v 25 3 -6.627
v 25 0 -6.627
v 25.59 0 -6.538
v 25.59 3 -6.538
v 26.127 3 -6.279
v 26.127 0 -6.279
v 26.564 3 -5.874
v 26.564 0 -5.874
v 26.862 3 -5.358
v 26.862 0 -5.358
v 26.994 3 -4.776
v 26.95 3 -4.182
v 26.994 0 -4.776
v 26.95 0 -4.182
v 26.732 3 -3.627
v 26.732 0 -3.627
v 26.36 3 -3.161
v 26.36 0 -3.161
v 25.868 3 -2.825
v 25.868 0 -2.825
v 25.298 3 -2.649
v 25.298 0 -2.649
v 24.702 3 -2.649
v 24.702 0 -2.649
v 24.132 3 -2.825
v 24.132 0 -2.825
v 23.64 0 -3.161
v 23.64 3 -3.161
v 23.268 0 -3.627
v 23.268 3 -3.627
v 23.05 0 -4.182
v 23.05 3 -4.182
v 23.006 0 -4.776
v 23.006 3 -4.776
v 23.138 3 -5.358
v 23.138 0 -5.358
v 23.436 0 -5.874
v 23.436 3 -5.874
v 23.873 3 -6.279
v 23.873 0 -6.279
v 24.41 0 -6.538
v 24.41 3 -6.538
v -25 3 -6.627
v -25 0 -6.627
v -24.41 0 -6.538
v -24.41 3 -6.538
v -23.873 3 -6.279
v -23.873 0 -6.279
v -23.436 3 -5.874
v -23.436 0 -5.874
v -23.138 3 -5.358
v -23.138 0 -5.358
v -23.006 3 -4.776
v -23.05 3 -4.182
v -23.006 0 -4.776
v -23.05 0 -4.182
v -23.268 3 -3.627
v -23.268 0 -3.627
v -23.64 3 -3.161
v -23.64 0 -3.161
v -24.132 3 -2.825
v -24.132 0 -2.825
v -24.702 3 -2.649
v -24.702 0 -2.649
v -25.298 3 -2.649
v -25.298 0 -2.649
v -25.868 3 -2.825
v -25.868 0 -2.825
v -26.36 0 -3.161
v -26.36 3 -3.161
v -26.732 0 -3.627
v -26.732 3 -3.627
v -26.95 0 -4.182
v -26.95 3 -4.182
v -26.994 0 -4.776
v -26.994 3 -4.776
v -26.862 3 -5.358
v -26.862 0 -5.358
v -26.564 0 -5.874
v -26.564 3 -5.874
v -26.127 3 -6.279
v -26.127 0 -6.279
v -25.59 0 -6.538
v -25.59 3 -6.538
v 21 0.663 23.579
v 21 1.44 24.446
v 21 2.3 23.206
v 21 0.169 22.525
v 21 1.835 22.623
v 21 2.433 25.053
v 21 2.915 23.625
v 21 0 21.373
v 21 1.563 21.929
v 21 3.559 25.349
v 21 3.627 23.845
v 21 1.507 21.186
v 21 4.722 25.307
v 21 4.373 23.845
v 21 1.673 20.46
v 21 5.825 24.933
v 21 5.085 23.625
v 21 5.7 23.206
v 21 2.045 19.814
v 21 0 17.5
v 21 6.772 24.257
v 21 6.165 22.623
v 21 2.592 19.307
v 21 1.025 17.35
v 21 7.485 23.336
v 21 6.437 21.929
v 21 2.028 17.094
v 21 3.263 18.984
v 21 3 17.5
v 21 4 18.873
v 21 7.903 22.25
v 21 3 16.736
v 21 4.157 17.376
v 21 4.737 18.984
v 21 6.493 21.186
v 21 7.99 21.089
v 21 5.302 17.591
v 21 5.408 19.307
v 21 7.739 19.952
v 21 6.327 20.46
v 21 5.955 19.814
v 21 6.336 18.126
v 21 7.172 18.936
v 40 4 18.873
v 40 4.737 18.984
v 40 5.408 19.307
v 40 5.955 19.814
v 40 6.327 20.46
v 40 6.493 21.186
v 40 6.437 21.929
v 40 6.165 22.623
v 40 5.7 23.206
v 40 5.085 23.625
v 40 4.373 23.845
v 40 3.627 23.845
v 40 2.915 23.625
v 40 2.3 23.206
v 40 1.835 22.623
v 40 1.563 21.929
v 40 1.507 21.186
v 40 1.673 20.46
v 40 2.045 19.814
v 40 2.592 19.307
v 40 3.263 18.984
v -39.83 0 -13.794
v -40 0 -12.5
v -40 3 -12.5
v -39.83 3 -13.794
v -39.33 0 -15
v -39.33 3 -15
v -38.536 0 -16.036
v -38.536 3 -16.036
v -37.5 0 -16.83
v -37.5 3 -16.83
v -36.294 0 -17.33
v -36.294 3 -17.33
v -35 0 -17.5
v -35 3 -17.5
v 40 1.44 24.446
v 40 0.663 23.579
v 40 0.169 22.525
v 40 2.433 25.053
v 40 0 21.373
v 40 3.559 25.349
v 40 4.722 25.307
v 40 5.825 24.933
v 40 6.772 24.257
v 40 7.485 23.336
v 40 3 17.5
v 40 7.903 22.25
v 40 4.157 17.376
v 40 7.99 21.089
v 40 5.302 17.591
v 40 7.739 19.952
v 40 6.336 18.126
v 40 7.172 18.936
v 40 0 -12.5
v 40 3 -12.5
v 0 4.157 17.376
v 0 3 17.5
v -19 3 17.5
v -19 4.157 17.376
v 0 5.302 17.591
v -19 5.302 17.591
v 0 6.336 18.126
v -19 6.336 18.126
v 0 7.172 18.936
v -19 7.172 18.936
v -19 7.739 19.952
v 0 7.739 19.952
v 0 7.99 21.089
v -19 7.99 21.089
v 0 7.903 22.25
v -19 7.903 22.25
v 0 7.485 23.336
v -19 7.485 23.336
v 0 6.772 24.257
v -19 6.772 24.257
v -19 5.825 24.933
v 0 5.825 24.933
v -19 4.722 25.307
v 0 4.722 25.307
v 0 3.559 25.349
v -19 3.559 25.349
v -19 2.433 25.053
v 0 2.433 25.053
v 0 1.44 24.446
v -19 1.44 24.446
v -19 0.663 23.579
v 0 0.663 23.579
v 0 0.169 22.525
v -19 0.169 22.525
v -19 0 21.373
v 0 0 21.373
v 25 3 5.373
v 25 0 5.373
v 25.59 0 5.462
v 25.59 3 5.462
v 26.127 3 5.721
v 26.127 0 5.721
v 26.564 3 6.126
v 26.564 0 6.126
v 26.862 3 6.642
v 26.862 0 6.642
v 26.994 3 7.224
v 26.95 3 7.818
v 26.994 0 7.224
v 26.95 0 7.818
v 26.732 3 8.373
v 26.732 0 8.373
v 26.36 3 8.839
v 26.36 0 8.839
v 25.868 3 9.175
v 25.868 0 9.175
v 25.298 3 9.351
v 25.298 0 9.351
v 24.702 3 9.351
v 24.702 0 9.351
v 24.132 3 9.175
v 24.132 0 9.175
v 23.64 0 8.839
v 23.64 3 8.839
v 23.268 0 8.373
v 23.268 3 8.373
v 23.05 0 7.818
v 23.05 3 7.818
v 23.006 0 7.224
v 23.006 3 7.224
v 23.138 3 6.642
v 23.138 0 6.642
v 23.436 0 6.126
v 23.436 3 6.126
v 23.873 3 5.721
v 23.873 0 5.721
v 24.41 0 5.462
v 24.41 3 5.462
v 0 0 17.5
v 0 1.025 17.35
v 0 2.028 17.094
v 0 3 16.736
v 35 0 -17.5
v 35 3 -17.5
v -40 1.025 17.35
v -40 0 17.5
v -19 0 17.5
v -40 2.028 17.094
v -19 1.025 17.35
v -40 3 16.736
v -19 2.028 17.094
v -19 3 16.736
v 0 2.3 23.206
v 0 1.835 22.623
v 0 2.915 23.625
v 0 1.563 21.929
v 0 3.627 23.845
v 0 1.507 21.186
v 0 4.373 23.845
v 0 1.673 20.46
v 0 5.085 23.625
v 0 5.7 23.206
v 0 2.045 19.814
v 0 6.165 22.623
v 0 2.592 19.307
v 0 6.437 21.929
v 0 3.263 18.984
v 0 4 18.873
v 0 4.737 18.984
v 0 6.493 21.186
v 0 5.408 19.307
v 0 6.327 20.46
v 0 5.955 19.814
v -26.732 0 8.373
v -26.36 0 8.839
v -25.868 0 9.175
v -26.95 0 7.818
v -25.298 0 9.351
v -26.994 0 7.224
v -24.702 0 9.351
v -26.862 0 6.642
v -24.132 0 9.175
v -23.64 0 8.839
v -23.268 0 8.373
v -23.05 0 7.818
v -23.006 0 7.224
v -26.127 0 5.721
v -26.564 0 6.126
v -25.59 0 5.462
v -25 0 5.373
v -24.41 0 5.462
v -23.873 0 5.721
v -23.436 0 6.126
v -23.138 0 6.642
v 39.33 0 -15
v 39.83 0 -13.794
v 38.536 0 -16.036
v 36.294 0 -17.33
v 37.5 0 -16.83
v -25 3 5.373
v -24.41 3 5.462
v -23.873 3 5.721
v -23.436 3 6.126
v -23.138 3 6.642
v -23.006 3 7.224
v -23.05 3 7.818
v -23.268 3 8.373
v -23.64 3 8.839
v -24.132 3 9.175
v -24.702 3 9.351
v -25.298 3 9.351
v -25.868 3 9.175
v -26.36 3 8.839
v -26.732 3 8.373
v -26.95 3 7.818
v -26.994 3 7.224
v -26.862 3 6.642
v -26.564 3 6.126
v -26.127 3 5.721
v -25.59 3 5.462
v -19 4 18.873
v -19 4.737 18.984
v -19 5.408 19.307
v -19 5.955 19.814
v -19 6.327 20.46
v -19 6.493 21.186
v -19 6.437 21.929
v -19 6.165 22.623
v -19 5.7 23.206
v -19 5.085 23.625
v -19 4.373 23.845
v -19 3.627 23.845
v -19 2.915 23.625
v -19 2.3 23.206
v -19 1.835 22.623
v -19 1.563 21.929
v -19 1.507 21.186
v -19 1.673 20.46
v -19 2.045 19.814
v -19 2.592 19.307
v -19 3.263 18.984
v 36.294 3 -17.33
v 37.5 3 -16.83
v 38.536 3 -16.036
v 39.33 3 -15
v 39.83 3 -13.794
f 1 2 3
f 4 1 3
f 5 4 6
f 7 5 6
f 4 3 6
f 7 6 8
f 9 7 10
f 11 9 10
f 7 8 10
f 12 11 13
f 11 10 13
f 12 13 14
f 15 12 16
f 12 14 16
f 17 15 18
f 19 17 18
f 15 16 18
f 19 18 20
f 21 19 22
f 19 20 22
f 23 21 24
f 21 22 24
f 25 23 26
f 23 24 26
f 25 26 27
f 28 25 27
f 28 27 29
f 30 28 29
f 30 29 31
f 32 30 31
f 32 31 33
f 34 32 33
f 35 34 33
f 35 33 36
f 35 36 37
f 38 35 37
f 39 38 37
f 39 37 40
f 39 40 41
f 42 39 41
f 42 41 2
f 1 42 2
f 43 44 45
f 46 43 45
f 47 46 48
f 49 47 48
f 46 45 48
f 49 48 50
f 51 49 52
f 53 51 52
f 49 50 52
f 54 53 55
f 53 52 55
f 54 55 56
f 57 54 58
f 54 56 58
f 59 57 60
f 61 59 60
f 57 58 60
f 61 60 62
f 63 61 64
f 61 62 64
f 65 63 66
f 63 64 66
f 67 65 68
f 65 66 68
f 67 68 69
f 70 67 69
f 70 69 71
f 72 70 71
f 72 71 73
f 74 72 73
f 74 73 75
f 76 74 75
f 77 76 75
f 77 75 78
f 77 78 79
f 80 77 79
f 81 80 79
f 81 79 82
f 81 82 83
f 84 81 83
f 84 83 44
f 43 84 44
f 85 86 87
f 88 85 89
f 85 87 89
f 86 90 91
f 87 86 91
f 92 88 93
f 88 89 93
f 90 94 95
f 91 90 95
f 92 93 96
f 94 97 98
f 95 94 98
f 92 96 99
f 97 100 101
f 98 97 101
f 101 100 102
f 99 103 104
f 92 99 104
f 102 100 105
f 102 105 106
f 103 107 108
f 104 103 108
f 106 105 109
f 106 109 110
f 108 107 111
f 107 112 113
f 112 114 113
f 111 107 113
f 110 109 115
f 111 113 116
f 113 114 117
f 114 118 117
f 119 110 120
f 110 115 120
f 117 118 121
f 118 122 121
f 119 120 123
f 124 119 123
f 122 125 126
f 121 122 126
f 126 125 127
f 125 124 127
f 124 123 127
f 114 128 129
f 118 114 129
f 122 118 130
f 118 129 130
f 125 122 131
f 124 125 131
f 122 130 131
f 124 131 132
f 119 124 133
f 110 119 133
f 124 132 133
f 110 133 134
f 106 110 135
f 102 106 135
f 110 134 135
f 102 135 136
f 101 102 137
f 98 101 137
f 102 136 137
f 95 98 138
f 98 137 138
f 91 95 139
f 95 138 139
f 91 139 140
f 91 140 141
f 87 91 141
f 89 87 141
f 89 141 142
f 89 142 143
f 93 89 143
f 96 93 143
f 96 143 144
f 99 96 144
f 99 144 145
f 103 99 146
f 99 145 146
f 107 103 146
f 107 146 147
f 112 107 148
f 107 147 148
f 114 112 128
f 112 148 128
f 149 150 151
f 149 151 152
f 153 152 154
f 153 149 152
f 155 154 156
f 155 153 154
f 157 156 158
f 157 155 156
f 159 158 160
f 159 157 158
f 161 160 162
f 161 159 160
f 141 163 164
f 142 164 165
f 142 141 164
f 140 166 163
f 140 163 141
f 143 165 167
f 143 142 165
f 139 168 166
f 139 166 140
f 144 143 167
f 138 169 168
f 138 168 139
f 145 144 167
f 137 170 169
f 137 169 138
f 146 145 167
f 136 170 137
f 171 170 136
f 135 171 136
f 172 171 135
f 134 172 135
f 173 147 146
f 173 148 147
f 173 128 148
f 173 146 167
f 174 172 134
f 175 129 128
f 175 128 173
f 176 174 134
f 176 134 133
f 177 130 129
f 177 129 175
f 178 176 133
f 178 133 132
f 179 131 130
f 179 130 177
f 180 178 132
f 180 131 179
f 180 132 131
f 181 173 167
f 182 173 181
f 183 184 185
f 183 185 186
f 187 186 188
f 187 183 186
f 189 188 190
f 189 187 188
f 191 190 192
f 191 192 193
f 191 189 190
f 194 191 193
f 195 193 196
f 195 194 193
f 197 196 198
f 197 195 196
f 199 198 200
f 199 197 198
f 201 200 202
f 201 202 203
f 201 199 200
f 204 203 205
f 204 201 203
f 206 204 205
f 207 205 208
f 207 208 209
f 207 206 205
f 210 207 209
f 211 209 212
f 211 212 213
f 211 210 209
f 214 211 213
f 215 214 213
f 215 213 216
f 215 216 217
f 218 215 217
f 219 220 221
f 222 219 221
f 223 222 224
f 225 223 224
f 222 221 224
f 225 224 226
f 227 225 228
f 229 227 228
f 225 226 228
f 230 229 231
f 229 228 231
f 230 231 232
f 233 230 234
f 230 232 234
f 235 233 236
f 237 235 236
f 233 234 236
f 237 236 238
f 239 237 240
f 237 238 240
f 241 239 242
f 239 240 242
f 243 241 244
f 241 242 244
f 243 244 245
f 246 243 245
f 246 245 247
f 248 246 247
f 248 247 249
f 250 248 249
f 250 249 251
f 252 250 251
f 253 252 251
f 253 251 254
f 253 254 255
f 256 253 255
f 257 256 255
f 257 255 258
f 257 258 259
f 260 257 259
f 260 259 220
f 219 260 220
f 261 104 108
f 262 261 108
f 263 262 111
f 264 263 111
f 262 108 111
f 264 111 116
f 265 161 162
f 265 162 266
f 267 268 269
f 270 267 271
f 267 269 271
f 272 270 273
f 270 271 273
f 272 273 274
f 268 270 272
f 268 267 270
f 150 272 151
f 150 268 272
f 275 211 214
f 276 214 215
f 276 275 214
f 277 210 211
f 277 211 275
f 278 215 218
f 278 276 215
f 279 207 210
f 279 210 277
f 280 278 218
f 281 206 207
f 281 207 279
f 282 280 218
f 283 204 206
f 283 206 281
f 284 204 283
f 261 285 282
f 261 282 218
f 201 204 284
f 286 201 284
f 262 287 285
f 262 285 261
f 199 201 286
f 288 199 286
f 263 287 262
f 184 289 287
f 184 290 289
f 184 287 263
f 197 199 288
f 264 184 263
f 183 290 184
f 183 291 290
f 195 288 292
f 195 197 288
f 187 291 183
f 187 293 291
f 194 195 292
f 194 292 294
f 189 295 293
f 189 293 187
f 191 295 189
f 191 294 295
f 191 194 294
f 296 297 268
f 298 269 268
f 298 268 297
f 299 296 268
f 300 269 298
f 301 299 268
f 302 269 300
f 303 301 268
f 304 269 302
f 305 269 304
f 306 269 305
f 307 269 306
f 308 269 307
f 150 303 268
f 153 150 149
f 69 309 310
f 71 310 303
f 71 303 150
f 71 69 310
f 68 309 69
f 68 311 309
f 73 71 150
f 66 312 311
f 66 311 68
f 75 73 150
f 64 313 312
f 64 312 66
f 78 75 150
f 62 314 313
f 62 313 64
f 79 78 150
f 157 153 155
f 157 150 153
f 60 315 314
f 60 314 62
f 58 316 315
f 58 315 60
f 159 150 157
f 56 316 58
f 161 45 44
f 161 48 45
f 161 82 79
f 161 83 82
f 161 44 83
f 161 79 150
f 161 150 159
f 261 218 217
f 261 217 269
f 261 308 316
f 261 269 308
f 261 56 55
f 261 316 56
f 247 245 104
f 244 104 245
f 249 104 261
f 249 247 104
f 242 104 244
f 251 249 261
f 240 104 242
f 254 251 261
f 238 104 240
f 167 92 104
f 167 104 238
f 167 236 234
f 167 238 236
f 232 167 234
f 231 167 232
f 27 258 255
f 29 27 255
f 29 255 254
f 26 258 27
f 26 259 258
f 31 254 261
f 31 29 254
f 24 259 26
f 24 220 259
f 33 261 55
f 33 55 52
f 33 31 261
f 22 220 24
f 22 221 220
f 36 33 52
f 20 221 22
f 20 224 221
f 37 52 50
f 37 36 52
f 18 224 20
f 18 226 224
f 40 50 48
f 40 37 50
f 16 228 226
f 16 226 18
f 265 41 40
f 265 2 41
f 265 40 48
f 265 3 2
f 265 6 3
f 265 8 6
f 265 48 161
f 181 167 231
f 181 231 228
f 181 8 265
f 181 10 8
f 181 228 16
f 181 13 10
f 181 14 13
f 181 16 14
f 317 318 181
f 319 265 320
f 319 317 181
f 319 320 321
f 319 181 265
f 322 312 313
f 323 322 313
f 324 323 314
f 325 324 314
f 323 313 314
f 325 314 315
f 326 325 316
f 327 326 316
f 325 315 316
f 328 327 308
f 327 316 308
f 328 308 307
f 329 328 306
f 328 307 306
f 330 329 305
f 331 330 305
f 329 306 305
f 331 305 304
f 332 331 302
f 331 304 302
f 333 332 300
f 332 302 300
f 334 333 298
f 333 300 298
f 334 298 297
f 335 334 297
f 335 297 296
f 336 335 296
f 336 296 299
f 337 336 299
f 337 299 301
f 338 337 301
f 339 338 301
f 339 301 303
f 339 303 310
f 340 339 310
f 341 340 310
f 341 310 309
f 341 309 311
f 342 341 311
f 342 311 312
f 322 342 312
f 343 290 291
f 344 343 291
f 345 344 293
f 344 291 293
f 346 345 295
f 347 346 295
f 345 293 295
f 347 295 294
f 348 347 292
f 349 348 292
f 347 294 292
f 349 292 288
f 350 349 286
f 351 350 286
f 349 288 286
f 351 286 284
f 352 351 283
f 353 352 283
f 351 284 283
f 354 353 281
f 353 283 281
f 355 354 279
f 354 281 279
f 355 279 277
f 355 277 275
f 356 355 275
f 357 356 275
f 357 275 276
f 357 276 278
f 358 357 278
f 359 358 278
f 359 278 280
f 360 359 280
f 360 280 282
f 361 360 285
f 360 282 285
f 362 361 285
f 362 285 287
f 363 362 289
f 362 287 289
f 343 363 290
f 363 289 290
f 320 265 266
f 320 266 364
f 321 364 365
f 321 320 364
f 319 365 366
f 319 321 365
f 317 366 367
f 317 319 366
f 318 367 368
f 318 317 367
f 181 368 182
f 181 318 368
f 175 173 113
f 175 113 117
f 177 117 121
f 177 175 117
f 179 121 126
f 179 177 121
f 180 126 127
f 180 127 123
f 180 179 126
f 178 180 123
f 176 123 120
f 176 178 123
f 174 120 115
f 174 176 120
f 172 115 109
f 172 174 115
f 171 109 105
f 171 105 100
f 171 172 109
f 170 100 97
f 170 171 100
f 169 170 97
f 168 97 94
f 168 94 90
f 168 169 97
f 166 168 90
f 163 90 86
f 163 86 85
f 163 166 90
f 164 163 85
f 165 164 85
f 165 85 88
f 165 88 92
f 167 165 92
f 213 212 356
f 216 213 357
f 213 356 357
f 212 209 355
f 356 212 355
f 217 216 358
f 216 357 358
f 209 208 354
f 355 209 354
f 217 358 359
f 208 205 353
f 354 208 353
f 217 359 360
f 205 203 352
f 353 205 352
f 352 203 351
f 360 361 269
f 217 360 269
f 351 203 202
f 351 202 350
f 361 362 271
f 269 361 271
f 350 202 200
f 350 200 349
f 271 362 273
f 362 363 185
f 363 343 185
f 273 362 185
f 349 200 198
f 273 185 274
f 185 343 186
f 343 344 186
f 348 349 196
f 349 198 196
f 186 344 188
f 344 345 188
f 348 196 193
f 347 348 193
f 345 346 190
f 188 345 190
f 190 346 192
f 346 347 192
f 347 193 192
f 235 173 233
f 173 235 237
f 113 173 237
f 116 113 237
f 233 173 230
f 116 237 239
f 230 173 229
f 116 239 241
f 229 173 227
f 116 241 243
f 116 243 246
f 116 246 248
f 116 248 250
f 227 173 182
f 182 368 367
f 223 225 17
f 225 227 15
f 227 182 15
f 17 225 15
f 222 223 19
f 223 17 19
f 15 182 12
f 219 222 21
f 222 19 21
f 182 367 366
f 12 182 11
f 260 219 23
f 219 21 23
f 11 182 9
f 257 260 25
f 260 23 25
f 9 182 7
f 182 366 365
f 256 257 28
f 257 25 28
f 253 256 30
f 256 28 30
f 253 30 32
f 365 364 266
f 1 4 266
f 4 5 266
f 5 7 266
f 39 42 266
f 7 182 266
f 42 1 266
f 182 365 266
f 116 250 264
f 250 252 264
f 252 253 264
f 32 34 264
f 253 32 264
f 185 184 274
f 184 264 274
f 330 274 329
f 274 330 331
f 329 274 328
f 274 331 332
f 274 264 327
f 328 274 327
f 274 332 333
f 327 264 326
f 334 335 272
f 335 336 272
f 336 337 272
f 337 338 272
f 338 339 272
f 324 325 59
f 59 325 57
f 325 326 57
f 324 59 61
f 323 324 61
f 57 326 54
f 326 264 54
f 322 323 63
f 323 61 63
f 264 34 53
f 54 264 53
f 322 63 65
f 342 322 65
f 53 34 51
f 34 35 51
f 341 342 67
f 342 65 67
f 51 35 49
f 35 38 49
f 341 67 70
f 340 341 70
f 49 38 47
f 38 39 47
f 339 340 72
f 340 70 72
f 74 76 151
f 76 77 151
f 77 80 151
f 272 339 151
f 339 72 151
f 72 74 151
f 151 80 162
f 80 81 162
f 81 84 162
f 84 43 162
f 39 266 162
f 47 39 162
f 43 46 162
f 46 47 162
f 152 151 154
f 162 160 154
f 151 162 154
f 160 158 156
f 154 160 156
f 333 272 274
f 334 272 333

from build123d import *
from OCP.BRepFilletAPI import BRepFilletAPI_MakeChamfer

# Parameters (mm, degrees)
BOSS_EXTRUDE1_DEPTH = 3
SKETCH2_R           = 2.5
BOSS_EXTRUDE2_DEPTH = 19
LPATTERN1_COUNT     = 2
LPATTERN1_PITCH     = 40
CHAMFER3_SIZE       = 1
CHAMFER3_SIZE2      = 0.624869352
FILLET1_R           = 10
SKETCH_1_R          = 2
CUT_EXTRUDE_1_DEPTH = 49.039445083


with BuildPart() as part:
    # Sketch1 → Boss-Extrude1 (new body)
    with BuildSketch(Plane(origin=(0, 0, 0), x_dir=(1, 0, 0), z_dir=(0, 1, 0))):
        with BuildLine():
            Line((-35, 17.5), (35, 17.5))
            ThreePointArc((35, 17.5), (38.535533906, 16.035533906), (40, 12.5))
            Line((40, 12.5), (40, -17.5))
            Line((40, -17.5), (-40, -17.5))
            Line((-40, -17.5), (-40, 12.5))
            ThreePointArc((-40, 12.5), (-38.535533906, 16.035533906), (-35, 17.5))
        make_face()
    extrude(amount=BOSS_EXTRUDE1_DEPTH)

    # Sketch2 → Boss-Extrude2 (add)
    with BuildSketch(Plane(origin=(40, 0, 0), x_dir=(0, 0, -1), z_dir=(1, 0, 0))):
        with BuildLine():
            Line((-21.372983346, 0), (-17.5, 0))
            Line((-17.5, 0), (-17.5, 3))
            ThreePointArc((-17.5, 3), (-23.822473089, 7.16227766), (-21.372983346, 0))
        make_face()
        with Locations((-21.372983346, 4)):
            Circle(SKETCH2_R, mode=Mode.SUBTRACT)
    boss_extrude2 = extrude(amount=-BOSS_EXTRUDE2_DEPTH)

    # LPattern1: Boss-Extrude2 ×2
    with Locations(*[(-i * LPATTERN1_PITCH, 0, 0) for i in range(1, LPATTERN1_COUNT)]):
        add(boss_extrude2)

    # Chamfer3: one chamfer whose edges measure the first distance from different faces: ONE call of the kernel's chamfer builder (chamfer() names one face for all edges)
    chamfer3_edges_1 = [part.edges().sort_by_distance(p)[0] for p in [
        (-29.5, 3, 17.5),
    ]]
    chamfer3_side_1 = [part.faces().sort_by_distance(p)[0] for p in [
        (-29.5, 1.5, 17.5),
    ]]
    chamfer3_edges_2 = [part.edges().sort_by_distance(p)[0] for p in [
        (10.5, 3, 17.5),
    ]]
    chamfer3_side_2 = [part.faces().sort_by_distance(p)[0] for p in [
        (10.5, 1.5, 17.5),
    ]]
    chamfer3 = BRepFilletAPI_MakeChamfer(part.part.solid().wrapped)
    for e in chamfer3_edges_1:
        chamfer3.Add(CHAMFER3_SIZE, CHAMFER3_SIZE2, e.wrapped, chamfer3_side_1[0].wrapped)  # the first distance lies on this face
    for e in chamfer3_edges_2:
        chamfer3.Add(CHAMFER3_SIZE, CHAMFER3_SIZE2, e.wrapped, chamfer3_side_2[0].wrapped)  # the first distance lies on this face
    add(Compound.cast(chamfer3.Shape()), mode=Mode.REPLACE)

    # Fillet1
    # the kernel refuses this fillet: 10 mm, written as the material it takes off along each edge
    with BuildSketch(Plane(origin=(21, 2, 17.5), x_dir=(0, 0.8480480961564257, -0.5299192642332051), z_dir=(-1, 0, 0))) as fillet1_piece_1:
        with BuildLine():
            CenterArc((2.784251212, 10), FILLET1_R, 243.382335319, 26.617664681)
            Line((-1.696096192, 1.059838528), (0, 0))
            Line((0, 0), (2.784251212, 0))
        make_face()
    extrude(amount=21, mode=Mode.SUBTRACT)
    with BuildSketch(Plane(origin=(-19, 2, 17.5), x_dir=(0, 0.8480480961564257, -0.5299192642332051), z_dir=(-1, 0, 0))) as fillet1_piece_2:
        with BuildLine():
            CenterArc((2.784251212, 10), FILLET1_R, 243.382335319, 26.617664681)
            Line((-1.696096192, 1.059838528), (0, 0))
            Line((0, 0), (2.784251212, 0))
        make_face()
    extrude(amount=27.96062803, mode=Mode.SUBTRACT)

    # 스케치1 → 컷-돌출1 (cut, through all)
    with BuildSketch(Plane.XZ):
        with Locations(Location((-25, 7.372983346, 0), (0, 0, 270))):
            Circle(SKETCH_1_R)
        with Locations(Location((-25, -4.627016654, 0), (0, 0, 270))):
            Circle(SKETCH_1_R)
        with Locations(Location((25, 7.372983346, 0), (0, 0, 270))):
            Circle(SKETCH_1_R)
        with Locations(Location((25, -4.627016654, 0), (0, 0, 270))):
            Circle(SKETCH_1_R)
    extrude(amount=-CUT_EXTRUDE_1_DEPTH, mode=Mode.SUBTRACT)


solid = part.part
